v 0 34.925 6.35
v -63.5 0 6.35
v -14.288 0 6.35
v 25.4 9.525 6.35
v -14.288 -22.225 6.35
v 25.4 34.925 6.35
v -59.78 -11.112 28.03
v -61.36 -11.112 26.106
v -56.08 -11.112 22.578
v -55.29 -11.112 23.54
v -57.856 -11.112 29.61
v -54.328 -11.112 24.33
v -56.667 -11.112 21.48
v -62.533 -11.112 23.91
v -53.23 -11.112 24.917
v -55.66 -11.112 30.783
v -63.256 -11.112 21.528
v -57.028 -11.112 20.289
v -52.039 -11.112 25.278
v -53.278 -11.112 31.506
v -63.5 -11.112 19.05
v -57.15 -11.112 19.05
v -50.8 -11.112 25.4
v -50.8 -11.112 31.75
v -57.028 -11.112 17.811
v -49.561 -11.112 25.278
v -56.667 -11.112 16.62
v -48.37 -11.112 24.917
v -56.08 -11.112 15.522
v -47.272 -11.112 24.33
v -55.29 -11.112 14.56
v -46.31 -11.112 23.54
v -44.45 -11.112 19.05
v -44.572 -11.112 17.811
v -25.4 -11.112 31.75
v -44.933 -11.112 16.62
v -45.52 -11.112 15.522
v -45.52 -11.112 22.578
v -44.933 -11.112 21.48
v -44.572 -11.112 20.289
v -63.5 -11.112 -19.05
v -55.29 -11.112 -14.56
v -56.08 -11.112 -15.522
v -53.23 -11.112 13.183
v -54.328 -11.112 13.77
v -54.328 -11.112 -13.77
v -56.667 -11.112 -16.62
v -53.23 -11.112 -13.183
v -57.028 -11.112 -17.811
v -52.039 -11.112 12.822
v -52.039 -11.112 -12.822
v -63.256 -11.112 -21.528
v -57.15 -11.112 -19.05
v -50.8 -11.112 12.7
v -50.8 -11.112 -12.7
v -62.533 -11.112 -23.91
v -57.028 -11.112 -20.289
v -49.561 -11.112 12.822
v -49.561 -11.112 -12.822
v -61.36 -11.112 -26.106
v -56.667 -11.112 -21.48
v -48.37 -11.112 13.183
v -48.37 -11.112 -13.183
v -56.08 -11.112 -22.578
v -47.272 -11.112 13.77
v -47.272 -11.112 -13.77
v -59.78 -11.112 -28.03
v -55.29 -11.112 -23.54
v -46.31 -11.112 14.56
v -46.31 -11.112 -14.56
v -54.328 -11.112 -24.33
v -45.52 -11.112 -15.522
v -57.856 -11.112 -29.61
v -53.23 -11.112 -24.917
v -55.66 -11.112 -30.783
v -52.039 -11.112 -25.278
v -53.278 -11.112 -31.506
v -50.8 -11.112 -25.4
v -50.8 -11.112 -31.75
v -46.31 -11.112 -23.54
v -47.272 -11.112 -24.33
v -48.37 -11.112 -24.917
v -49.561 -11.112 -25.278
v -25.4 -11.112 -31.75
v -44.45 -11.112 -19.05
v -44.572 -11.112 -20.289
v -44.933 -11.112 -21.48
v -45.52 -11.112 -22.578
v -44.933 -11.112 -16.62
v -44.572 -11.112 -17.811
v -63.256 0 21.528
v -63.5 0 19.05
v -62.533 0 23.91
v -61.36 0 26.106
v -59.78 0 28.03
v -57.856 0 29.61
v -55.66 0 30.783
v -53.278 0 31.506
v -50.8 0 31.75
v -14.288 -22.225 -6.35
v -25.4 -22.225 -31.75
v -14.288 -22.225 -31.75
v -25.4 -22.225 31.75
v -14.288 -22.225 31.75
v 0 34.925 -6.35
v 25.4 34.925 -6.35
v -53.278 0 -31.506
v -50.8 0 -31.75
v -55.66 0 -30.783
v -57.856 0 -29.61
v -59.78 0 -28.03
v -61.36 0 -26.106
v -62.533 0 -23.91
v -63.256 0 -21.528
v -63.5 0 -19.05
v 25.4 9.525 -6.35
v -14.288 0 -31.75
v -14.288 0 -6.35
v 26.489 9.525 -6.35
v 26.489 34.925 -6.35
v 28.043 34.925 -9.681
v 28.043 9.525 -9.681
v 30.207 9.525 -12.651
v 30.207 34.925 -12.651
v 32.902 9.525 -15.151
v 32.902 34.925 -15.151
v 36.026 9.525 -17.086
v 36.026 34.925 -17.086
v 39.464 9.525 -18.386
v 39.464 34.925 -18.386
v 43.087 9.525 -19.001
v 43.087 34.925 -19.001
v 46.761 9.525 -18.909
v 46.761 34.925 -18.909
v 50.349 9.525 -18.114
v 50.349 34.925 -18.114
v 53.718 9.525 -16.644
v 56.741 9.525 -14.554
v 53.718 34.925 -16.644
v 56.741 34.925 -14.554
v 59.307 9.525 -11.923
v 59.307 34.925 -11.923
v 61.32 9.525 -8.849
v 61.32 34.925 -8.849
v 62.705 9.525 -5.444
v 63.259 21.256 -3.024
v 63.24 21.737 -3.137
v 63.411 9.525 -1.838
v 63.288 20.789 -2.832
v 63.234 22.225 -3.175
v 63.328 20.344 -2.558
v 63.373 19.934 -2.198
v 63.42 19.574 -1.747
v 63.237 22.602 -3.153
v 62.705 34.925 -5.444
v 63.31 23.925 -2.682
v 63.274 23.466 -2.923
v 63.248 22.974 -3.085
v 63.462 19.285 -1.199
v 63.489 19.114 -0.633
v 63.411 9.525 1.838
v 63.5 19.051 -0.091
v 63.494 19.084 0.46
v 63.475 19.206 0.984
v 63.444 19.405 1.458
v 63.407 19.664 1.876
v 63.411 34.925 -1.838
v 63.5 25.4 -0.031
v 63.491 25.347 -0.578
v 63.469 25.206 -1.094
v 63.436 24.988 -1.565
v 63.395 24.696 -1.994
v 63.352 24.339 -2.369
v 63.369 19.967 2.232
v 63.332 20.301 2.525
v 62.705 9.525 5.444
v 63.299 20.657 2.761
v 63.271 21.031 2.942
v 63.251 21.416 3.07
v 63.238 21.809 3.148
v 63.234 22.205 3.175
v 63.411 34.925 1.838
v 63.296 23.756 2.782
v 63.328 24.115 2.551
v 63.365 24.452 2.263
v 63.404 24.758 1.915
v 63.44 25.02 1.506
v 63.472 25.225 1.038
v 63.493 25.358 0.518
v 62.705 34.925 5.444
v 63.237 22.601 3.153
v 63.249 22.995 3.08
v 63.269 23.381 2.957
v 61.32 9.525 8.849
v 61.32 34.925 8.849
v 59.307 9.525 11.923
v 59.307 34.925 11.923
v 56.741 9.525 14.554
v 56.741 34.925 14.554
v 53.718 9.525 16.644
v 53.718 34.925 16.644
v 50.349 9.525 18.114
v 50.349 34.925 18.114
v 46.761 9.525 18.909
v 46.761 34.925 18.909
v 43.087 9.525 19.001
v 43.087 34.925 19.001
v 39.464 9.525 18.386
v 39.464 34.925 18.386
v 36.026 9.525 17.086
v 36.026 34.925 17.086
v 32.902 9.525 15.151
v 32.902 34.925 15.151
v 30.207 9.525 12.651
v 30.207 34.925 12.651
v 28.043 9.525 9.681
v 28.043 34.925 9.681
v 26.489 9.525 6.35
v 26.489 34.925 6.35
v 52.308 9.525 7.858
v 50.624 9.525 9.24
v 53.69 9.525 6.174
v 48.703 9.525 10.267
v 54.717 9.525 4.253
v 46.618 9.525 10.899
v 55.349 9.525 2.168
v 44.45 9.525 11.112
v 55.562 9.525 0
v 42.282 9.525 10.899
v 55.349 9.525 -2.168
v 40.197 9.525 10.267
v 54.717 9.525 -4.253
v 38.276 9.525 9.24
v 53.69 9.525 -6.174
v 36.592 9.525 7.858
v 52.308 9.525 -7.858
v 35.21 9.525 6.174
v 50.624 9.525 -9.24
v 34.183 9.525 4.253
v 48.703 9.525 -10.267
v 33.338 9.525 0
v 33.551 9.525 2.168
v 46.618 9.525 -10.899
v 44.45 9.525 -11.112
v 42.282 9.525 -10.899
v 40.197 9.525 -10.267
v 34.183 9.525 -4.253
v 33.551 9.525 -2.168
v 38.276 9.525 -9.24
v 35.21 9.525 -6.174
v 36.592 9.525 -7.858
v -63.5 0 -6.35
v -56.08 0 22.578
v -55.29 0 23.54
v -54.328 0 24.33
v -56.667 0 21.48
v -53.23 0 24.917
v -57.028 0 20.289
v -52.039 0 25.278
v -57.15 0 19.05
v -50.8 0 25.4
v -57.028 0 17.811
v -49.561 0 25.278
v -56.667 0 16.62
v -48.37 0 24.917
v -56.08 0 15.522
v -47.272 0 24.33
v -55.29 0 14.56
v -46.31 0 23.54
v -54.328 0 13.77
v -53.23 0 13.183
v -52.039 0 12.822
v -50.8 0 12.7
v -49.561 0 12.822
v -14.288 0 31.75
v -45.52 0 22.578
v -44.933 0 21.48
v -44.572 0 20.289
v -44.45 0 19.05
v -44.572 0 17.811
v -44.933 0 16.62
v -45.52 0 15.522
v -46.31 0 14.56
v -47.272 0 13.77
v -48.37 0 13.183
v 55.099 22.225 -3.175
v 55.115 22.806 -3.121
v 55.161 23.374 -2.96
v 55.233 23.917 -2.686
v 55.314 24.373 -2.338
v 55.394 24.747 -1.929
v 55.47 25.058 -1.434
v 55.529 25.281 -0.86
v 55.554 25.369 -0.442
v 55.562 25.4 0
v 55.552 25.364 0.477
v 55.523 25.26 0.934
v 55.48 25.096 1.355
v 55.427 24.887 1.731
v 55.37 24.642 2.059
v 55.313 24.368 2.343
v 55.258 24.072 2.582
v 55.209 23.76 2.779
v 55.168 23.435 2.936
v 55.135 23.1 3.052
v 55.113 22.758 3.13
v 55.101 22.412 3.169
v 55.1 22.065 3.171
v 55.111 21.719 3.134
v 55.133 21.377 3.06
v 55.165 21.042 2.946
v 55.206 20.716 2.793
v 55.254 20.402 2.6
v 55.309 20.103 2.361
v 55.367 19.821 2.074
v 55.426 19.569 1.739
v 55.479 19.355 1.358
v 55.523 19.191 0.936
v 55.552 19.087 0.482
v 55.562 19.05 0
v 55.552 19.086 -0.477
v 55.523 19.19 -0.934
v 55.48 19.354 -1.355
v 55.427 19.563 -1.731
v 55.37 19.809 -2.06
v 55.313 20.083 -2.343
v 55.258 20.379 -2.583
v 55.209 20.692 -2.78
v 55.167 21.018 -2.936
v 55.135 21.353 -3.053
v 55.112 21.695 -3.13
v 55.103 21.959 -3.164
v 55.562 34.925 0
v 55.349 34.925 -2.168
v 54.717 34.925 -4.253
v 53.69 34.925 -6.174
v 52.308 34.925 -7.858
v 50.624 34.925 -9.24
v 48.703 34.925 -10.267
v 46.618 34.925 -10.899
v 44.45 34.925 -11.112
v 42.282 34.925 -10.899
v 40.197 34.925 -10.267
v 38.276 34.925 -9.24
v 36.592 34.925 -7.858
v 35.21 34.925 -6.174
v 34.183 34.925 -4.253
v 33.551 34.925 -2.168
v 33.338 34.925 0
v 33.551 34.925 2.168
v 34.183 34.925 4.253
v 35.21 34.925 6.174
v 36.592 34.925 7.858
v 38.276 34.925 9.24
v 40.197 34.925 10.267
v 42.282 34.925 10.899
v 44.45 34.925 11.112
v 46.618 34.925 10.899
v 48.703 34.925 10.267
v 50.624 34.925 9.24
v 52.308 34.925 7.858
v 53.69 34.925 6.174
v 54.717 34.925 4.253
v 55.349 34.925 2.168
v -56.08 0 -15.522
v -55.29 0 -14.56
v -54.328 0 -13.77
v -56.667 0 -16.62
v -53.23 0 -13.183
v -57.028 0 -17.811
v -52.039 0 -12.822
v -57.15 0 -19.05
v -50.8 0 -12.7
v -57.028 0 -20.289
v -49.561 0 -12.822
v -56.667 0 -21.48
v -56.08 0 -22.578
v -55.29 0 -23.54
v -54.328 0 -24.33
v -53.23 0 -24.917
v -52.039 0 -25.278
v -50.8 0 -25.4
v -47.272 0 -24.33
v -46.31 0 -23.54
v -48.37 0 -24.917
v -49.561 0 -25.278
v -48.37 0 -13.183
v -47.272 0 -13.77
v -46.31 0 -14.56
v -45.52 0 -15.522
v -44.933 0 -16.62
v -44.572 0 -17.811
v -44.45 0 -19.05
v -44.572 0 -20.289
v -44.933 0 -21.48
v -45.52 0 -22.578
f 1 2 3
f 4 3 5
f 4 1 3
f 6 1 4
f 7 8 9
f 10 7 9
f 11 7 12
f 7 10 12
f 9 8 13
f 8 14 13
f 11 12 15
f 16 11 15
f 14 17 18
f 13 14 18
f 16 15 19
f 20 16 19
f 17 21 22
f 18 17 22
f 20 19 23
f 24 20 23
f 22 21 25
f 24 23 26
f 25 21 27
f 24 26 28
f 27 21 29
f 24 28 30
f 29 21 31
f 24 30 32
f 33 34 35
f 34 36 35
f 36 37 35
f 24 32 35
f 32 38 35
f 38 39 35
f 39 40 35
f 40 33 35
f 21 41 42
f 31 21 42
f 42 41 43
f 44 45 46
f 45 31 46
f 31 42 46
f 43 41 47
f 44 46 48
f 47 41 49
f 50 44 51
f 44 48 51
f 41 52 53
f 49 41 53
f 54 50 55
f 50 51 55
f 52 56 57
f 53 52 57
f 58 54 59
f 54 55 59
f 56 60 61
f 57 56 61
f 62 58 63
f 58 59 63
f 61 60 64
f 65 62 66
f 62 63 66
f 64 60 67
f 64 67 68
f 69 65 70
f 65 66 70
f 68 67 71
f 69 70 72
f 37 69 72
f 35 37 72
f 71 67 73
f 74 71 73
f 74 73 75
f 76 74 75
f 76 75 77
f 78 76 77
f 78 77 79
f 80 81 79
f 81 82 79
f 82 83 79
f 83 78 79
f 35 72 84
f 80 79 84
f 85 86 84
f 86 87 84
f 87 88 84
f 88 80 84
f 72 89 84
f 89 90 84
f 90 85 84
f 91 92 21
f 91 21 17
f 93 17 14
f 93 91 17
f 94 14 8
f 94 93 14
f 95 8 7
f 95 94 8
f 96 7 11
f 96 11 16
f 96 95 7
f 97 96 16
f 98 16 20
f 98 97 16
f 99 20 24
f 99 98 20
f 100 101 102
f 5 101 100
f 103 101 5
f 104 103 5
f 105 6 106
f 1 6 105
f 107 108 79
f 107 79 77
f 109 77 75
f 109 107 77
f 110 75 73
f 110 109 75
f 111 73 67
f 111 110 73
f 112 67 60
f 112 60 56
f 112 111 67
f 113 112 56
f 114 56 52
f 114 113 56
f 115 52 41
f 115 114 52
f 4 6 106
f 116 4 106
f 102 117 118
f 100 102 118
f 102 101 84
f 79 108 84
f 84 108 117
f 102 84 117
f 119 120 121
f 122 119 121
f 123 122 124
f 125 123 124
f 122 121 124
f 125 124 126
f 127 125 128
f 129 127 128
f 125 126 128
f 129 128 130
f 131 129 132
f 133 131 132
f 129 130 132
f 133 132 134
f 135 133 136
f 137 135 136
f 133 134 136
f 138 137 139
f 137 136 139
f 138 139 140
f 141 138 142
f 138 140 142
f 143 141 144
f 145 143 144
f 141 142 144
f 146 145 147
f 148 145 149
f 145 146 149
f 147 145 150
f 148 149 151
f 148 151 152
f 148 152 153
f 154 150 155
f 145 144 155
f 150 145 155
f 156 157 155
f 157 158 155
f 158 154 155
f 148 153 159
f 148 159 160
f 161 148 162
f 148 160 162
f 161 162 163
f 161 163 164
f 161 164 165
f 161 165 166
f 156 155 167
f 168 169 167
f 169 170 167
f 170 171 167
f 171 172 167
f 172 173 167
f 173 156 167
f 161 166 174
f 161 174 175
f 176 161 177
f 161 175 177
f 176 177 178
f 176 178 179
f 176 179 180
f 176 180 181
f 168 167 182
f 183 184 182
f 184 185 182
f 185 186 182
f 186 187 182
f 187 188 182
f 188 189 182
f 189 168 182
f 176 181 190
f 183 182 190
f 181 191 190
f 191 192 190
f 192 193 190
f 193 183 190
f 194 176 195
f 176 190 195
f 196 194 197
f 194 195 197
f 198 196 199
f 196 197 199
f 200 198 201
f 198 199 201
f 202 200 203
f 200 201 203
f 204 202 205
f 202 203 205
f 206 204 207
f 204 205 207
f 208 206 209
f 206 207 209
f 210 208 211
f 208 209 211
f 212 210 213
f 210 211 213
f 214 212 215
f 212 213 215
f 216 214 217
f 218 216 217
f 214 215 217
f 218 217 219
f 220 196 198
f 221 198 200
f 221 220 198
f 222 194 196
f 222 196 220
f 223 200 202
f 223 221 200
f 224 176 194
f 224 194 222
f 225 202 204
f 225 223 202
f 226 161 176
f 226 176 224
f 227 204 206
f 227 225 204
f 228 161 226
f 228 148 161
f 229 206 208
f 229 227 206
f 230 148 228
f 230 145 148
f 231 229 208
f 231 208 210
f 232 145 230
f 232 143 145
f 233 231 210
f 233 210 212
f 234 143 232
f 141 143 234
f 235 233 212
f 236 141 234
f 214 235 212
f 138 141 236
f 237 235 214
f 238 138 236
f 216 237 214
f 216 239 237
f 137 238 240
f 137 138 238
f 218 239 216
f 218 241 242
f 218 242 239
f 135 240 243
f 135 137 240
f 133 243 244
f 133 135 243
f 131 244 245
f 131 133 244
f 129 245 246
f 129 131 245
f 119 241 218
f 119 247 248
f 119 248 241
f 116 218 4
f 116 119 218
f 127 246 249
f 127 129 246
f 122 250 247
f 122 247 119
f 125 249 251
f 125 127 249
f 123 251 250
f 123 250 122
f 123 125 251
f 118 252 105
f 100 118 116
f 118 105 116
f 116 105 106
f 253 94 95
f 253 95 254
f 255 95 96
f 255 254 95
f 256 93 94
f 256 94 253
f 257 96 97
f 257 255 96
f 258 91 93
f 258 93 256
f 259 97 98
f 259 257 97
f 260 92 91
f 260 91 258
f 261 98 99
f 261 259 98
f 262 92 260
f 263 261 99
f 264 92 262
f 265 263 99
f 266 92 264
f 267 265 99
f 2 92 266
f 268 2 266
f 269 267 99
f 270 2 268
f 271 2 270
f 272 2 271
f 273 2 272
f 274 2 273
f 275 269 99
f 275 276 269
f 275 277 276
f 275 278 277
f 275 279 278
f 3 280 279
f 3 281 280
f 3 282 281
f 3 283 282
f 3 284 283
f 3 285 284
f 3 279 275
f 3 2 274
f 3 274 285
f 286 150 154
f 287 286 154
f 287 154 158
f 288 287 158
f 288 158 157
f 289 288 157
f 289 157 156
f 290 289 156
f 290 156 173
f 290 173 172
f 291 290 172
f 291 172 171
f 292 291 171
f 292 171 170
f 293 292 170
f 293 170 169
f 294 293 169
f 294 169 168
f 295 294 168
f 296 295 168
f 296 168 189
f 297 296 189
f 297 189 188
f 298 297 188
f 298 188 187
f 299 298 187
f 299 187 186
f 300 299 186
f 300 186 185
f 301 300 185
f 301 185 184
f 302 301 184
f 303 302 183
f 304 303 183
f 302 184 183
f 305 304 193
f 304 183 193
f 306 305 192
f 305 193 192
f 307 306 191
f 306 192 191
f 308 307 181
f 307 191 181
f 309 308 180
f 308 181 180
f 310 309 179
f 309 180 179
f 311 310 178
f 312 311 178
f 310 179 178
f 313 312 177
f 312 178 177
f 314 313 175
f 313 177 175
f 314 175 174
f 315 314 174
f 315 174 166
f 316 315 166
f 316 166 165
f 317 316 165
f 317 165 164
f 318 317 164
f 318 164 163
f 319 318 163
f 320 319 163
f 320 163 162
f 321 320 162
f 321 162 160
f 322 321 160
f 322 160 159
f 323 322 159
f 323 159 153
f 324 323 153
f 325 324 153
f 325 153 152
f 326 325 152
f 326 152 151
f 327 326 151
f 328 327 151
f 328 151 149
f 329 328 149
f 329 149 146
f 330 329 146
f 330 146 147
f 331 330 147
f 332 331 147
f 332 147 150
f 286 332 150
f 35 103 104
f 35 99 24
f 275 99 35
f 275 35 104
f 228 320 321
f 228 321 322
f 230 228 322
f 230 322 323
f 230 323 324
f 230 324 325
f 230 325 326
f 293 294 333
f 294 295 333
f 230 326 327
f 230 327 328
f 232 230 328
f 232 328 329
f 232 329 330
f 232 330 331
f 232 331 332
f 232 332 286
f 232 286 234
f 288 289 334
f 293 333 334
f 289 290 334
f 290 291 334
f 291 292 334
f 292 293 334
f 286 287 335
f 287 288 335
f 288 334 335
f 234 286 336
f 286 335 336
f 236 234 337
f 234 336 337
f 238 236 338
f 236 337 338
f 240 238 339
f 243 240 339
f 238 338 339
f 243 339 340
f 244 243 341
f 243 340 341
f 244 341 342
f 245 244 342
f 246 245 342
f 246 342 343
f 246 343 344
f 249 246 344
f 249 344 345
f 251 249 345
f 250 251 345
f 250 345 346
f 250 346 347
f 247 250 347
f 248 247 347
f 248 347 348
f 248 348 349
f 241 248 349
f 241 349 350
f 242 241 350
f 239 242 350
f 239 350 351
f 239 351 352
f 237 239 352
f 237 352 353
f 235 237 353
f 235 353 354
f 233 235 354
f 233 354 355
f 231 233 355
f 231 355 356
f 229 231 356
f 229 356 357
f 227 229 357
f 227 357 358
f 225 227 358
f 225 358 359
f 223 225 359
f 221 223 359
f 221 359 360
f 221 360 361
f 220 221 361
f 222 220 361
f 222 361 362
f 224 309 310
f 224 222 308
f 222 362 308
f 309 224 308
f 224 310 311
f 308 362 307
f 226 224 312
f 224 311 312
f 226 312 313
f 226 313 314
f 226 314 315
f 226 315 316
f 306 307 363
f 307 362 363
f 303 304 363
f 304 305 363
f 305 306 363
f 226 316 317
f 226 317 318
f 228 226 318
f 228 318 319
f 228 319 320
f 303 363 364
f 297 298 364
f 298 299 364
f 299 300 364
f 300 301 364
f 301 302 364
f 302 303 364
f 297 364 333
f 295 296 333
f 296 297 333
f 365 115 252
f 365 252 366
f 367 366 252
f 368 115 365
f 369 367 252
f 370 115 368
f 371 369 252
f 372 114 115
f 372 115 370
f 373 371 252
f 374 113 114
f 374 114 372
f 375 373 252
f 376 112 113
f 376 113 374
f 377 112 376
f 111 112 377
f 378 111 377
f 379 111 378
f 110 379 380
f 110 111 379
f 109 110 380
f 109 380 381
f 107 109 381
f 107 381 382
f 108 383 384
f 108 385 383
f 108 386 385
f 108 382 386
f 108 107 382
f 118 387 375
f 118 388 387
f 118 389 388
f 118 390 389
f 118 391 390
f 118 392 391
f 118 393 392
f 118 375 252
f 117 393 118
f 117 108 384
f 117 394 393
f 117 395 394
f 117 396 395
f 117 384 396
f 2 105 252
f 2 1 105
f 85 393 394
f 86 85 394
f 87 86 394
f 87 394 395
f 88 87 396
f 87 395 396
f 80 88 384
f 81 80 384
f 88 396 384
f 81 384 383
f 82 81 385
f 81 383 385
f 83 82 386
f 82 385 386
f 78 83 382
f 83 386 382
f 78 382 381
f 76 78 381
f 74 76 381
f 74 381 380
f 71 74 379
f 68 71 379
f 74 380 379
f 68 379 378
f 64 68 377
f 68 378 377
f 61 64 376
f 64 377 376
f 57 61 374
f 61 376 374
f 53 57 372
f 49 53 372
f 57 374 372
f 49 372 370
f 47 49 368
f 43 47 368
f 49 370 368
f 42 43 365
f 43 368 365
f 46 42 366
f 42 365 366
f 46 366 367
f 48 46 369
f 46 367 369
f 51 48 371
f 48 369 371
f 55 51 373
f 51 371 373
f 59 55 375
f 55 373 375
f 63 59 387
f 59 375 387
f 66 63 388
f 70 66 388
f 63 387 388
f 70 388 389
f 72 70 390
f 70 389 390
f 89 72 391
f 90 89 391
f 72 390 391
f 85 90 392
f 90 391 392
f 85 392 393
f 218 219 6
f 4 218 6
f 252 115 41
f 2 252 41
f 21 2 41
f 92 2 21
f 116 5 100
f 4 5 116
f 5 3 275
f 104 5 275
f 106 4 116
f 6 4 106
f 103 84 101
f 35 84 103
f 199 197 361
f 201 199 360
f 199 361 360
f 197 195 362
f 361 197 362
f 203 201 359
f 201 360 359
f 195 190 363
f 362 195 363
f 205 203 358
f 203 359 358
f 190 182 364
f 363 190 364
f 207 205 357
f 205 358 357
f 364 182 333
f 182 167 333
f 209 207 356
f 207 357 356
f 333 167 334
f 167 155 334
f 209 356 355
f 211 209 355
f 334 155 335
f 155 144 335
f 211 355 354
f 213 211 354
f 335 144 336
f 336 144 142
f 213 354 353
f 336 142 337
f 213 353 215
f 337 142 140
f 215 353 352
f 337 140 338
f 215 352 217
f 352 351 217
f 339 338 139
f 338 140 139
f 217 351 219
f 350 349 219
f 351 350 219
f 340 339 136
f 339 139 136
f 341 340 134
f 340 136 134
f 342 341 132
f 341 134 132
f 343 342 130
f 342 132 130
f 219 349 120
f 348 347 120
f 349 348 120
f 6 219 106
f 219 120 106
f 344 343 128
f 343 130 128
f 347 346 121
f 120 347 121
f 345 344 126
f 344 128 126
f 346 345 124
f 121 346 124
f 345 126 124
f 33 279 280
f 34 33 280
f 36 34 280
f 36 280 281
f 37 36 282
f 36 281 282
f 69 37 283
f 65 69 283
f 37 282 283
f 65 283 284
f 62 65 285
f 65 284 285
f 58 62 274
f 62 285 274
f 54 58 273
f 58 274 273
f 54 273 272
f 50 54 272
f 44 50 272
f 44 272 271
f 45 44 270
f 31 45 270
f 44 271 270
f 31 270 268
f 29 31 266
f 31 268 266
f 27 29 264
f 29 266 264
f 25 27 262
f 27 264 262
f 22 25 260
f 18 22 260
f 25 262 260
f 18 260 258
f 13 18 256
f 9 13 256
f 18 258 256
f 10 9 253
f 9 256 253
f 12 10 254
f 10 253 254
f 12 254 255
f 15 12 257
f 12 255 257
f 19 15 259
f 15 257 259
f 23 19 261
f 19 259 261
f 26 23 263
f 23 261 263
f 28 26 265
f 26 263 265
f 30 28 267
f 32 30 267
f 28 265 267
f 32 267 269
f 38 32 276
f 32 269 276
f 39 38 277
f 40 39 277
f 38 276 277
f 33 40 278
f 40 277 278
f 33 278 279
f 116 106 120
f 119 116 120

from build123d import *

# Parameters (mm, degrees)
CROQUIS1_R              = 6.35
SALIENTE_EXTRUIR3_DEPTH = 11.1125
CROQUIS3_W              = 11.1125
CROQUIS3_H              = 63.5
SALIENTE_EXTRUIR4_DEPTH = 11.1125
SALIENTE_EXTRUIR5_DEPTH = 6.35
CROQUIS6_R              = 11.1125
SALIENTE_EXTRUIR6_DEPTH = 25.4
CROQUIS7_R              = 3.175
CORTAR_EXTRUIR2_DEPTH   = 19.05


with BuildPart() as part:
    # Croquis1 → Saliente-Extruir3 (new body)
    with BuildSketch(Plane(origin=(0, 0, 0), x_dir=(1, 0, 0), z_dir=(0, 1, 0))):
        with BuildLine():
            Line((-63.5, 19.05), (-63.5, -19.05))
            ThreePointArc((-63.5, -19.05), (-59.780256121, -28.030256121), (-50.8, -31.75))
            Line((-50.8, -31.75), (-14.2875, -31.75))
            Line((-14.2875, -31.75), (-14.2875, 31.75))
            Line((-14.2875, 31.75), (-50.8, 31.75))
            ThreePointArc((-50.8, 31.75), (-59.780256121, 28.030256121), (-63.5, 19.05))
        make_face()
        with Locations((-50.8, -19.05)):
            Circle(CROQUIS1_R, mode=Mode.SUBTRACT)
        with Locations((-50.8, 19.05)):
            Circle(CROQUIS1_R, mode=Mode.SUBTRACT)
    extrude(amount=-SALIENTE_EXTRUIR3_DEPTH)

    # Croquis3 → Saliente-Extruir4 (add)
    with BuildSketch(Plane.XZ.offset(11.1125)):
        with Locations((-19.84375, 0)):
            Rectangle(CROQUIS3_W, CROQUIS3_H)
    extrude(amount=SALIENTE_EXTRUIR4_DEPTH)

    # Croquis4 → Saliente-Extruir5 (add, symmetric)
    with BuildSketch(Plane.XY):
        Polygon((-63.5, 0), (-14.2875, 0), (-14.2875, -22.225), (25.4, 9.525), (25.4, 34.925), (0, 34.925), align=None)
    extrude(amount=SALIENTE_EXTRUIR5_DEPTH, both=True)


with BuildPart() as body_2:
    # Croquis6 → Saliente-Extruir6 (new body)
    with BuildSketch(Plane(origin=(0, 34.925, 0), x_dir=(1, 0, 0), z_dir=(0, 1, 0))):
        with BuildLine():
            Line((25.4, 6.35), (26.489487758, 6.35))
            ThreePointArc((26.489487758, 6.35), (63.5, 0), (26.489487758, -6.35))
            Line((26.489487758, -6.35), (25.4, -6.35))
            Line((25.4, -6.35), (25.4, 6.35))
        make_face()
        with Locations((44.45, 0)):
            Circle(CROQUIS6_R, mode=Mode.SUBTRACT)
    extrude(amount=-SALIENTE_EXTRUIR6_DEPTH)

    # Croquis7 → Cortar-Extruir2 (cut)
    with BuildSketch(Plane(origin=(63.5, 0, 0), x_dir=(0, 0, -1), z_dir=(1, 0, 0))):
        with Locations((0, 22.225)):
            Circle(CROQUIS7_R)
    extrude(amount=-CORTAR_EXTRUIR2_DEPTH, mode=Mode.SUBTRACT)


solid = Compound([part.part, body_2.part])
